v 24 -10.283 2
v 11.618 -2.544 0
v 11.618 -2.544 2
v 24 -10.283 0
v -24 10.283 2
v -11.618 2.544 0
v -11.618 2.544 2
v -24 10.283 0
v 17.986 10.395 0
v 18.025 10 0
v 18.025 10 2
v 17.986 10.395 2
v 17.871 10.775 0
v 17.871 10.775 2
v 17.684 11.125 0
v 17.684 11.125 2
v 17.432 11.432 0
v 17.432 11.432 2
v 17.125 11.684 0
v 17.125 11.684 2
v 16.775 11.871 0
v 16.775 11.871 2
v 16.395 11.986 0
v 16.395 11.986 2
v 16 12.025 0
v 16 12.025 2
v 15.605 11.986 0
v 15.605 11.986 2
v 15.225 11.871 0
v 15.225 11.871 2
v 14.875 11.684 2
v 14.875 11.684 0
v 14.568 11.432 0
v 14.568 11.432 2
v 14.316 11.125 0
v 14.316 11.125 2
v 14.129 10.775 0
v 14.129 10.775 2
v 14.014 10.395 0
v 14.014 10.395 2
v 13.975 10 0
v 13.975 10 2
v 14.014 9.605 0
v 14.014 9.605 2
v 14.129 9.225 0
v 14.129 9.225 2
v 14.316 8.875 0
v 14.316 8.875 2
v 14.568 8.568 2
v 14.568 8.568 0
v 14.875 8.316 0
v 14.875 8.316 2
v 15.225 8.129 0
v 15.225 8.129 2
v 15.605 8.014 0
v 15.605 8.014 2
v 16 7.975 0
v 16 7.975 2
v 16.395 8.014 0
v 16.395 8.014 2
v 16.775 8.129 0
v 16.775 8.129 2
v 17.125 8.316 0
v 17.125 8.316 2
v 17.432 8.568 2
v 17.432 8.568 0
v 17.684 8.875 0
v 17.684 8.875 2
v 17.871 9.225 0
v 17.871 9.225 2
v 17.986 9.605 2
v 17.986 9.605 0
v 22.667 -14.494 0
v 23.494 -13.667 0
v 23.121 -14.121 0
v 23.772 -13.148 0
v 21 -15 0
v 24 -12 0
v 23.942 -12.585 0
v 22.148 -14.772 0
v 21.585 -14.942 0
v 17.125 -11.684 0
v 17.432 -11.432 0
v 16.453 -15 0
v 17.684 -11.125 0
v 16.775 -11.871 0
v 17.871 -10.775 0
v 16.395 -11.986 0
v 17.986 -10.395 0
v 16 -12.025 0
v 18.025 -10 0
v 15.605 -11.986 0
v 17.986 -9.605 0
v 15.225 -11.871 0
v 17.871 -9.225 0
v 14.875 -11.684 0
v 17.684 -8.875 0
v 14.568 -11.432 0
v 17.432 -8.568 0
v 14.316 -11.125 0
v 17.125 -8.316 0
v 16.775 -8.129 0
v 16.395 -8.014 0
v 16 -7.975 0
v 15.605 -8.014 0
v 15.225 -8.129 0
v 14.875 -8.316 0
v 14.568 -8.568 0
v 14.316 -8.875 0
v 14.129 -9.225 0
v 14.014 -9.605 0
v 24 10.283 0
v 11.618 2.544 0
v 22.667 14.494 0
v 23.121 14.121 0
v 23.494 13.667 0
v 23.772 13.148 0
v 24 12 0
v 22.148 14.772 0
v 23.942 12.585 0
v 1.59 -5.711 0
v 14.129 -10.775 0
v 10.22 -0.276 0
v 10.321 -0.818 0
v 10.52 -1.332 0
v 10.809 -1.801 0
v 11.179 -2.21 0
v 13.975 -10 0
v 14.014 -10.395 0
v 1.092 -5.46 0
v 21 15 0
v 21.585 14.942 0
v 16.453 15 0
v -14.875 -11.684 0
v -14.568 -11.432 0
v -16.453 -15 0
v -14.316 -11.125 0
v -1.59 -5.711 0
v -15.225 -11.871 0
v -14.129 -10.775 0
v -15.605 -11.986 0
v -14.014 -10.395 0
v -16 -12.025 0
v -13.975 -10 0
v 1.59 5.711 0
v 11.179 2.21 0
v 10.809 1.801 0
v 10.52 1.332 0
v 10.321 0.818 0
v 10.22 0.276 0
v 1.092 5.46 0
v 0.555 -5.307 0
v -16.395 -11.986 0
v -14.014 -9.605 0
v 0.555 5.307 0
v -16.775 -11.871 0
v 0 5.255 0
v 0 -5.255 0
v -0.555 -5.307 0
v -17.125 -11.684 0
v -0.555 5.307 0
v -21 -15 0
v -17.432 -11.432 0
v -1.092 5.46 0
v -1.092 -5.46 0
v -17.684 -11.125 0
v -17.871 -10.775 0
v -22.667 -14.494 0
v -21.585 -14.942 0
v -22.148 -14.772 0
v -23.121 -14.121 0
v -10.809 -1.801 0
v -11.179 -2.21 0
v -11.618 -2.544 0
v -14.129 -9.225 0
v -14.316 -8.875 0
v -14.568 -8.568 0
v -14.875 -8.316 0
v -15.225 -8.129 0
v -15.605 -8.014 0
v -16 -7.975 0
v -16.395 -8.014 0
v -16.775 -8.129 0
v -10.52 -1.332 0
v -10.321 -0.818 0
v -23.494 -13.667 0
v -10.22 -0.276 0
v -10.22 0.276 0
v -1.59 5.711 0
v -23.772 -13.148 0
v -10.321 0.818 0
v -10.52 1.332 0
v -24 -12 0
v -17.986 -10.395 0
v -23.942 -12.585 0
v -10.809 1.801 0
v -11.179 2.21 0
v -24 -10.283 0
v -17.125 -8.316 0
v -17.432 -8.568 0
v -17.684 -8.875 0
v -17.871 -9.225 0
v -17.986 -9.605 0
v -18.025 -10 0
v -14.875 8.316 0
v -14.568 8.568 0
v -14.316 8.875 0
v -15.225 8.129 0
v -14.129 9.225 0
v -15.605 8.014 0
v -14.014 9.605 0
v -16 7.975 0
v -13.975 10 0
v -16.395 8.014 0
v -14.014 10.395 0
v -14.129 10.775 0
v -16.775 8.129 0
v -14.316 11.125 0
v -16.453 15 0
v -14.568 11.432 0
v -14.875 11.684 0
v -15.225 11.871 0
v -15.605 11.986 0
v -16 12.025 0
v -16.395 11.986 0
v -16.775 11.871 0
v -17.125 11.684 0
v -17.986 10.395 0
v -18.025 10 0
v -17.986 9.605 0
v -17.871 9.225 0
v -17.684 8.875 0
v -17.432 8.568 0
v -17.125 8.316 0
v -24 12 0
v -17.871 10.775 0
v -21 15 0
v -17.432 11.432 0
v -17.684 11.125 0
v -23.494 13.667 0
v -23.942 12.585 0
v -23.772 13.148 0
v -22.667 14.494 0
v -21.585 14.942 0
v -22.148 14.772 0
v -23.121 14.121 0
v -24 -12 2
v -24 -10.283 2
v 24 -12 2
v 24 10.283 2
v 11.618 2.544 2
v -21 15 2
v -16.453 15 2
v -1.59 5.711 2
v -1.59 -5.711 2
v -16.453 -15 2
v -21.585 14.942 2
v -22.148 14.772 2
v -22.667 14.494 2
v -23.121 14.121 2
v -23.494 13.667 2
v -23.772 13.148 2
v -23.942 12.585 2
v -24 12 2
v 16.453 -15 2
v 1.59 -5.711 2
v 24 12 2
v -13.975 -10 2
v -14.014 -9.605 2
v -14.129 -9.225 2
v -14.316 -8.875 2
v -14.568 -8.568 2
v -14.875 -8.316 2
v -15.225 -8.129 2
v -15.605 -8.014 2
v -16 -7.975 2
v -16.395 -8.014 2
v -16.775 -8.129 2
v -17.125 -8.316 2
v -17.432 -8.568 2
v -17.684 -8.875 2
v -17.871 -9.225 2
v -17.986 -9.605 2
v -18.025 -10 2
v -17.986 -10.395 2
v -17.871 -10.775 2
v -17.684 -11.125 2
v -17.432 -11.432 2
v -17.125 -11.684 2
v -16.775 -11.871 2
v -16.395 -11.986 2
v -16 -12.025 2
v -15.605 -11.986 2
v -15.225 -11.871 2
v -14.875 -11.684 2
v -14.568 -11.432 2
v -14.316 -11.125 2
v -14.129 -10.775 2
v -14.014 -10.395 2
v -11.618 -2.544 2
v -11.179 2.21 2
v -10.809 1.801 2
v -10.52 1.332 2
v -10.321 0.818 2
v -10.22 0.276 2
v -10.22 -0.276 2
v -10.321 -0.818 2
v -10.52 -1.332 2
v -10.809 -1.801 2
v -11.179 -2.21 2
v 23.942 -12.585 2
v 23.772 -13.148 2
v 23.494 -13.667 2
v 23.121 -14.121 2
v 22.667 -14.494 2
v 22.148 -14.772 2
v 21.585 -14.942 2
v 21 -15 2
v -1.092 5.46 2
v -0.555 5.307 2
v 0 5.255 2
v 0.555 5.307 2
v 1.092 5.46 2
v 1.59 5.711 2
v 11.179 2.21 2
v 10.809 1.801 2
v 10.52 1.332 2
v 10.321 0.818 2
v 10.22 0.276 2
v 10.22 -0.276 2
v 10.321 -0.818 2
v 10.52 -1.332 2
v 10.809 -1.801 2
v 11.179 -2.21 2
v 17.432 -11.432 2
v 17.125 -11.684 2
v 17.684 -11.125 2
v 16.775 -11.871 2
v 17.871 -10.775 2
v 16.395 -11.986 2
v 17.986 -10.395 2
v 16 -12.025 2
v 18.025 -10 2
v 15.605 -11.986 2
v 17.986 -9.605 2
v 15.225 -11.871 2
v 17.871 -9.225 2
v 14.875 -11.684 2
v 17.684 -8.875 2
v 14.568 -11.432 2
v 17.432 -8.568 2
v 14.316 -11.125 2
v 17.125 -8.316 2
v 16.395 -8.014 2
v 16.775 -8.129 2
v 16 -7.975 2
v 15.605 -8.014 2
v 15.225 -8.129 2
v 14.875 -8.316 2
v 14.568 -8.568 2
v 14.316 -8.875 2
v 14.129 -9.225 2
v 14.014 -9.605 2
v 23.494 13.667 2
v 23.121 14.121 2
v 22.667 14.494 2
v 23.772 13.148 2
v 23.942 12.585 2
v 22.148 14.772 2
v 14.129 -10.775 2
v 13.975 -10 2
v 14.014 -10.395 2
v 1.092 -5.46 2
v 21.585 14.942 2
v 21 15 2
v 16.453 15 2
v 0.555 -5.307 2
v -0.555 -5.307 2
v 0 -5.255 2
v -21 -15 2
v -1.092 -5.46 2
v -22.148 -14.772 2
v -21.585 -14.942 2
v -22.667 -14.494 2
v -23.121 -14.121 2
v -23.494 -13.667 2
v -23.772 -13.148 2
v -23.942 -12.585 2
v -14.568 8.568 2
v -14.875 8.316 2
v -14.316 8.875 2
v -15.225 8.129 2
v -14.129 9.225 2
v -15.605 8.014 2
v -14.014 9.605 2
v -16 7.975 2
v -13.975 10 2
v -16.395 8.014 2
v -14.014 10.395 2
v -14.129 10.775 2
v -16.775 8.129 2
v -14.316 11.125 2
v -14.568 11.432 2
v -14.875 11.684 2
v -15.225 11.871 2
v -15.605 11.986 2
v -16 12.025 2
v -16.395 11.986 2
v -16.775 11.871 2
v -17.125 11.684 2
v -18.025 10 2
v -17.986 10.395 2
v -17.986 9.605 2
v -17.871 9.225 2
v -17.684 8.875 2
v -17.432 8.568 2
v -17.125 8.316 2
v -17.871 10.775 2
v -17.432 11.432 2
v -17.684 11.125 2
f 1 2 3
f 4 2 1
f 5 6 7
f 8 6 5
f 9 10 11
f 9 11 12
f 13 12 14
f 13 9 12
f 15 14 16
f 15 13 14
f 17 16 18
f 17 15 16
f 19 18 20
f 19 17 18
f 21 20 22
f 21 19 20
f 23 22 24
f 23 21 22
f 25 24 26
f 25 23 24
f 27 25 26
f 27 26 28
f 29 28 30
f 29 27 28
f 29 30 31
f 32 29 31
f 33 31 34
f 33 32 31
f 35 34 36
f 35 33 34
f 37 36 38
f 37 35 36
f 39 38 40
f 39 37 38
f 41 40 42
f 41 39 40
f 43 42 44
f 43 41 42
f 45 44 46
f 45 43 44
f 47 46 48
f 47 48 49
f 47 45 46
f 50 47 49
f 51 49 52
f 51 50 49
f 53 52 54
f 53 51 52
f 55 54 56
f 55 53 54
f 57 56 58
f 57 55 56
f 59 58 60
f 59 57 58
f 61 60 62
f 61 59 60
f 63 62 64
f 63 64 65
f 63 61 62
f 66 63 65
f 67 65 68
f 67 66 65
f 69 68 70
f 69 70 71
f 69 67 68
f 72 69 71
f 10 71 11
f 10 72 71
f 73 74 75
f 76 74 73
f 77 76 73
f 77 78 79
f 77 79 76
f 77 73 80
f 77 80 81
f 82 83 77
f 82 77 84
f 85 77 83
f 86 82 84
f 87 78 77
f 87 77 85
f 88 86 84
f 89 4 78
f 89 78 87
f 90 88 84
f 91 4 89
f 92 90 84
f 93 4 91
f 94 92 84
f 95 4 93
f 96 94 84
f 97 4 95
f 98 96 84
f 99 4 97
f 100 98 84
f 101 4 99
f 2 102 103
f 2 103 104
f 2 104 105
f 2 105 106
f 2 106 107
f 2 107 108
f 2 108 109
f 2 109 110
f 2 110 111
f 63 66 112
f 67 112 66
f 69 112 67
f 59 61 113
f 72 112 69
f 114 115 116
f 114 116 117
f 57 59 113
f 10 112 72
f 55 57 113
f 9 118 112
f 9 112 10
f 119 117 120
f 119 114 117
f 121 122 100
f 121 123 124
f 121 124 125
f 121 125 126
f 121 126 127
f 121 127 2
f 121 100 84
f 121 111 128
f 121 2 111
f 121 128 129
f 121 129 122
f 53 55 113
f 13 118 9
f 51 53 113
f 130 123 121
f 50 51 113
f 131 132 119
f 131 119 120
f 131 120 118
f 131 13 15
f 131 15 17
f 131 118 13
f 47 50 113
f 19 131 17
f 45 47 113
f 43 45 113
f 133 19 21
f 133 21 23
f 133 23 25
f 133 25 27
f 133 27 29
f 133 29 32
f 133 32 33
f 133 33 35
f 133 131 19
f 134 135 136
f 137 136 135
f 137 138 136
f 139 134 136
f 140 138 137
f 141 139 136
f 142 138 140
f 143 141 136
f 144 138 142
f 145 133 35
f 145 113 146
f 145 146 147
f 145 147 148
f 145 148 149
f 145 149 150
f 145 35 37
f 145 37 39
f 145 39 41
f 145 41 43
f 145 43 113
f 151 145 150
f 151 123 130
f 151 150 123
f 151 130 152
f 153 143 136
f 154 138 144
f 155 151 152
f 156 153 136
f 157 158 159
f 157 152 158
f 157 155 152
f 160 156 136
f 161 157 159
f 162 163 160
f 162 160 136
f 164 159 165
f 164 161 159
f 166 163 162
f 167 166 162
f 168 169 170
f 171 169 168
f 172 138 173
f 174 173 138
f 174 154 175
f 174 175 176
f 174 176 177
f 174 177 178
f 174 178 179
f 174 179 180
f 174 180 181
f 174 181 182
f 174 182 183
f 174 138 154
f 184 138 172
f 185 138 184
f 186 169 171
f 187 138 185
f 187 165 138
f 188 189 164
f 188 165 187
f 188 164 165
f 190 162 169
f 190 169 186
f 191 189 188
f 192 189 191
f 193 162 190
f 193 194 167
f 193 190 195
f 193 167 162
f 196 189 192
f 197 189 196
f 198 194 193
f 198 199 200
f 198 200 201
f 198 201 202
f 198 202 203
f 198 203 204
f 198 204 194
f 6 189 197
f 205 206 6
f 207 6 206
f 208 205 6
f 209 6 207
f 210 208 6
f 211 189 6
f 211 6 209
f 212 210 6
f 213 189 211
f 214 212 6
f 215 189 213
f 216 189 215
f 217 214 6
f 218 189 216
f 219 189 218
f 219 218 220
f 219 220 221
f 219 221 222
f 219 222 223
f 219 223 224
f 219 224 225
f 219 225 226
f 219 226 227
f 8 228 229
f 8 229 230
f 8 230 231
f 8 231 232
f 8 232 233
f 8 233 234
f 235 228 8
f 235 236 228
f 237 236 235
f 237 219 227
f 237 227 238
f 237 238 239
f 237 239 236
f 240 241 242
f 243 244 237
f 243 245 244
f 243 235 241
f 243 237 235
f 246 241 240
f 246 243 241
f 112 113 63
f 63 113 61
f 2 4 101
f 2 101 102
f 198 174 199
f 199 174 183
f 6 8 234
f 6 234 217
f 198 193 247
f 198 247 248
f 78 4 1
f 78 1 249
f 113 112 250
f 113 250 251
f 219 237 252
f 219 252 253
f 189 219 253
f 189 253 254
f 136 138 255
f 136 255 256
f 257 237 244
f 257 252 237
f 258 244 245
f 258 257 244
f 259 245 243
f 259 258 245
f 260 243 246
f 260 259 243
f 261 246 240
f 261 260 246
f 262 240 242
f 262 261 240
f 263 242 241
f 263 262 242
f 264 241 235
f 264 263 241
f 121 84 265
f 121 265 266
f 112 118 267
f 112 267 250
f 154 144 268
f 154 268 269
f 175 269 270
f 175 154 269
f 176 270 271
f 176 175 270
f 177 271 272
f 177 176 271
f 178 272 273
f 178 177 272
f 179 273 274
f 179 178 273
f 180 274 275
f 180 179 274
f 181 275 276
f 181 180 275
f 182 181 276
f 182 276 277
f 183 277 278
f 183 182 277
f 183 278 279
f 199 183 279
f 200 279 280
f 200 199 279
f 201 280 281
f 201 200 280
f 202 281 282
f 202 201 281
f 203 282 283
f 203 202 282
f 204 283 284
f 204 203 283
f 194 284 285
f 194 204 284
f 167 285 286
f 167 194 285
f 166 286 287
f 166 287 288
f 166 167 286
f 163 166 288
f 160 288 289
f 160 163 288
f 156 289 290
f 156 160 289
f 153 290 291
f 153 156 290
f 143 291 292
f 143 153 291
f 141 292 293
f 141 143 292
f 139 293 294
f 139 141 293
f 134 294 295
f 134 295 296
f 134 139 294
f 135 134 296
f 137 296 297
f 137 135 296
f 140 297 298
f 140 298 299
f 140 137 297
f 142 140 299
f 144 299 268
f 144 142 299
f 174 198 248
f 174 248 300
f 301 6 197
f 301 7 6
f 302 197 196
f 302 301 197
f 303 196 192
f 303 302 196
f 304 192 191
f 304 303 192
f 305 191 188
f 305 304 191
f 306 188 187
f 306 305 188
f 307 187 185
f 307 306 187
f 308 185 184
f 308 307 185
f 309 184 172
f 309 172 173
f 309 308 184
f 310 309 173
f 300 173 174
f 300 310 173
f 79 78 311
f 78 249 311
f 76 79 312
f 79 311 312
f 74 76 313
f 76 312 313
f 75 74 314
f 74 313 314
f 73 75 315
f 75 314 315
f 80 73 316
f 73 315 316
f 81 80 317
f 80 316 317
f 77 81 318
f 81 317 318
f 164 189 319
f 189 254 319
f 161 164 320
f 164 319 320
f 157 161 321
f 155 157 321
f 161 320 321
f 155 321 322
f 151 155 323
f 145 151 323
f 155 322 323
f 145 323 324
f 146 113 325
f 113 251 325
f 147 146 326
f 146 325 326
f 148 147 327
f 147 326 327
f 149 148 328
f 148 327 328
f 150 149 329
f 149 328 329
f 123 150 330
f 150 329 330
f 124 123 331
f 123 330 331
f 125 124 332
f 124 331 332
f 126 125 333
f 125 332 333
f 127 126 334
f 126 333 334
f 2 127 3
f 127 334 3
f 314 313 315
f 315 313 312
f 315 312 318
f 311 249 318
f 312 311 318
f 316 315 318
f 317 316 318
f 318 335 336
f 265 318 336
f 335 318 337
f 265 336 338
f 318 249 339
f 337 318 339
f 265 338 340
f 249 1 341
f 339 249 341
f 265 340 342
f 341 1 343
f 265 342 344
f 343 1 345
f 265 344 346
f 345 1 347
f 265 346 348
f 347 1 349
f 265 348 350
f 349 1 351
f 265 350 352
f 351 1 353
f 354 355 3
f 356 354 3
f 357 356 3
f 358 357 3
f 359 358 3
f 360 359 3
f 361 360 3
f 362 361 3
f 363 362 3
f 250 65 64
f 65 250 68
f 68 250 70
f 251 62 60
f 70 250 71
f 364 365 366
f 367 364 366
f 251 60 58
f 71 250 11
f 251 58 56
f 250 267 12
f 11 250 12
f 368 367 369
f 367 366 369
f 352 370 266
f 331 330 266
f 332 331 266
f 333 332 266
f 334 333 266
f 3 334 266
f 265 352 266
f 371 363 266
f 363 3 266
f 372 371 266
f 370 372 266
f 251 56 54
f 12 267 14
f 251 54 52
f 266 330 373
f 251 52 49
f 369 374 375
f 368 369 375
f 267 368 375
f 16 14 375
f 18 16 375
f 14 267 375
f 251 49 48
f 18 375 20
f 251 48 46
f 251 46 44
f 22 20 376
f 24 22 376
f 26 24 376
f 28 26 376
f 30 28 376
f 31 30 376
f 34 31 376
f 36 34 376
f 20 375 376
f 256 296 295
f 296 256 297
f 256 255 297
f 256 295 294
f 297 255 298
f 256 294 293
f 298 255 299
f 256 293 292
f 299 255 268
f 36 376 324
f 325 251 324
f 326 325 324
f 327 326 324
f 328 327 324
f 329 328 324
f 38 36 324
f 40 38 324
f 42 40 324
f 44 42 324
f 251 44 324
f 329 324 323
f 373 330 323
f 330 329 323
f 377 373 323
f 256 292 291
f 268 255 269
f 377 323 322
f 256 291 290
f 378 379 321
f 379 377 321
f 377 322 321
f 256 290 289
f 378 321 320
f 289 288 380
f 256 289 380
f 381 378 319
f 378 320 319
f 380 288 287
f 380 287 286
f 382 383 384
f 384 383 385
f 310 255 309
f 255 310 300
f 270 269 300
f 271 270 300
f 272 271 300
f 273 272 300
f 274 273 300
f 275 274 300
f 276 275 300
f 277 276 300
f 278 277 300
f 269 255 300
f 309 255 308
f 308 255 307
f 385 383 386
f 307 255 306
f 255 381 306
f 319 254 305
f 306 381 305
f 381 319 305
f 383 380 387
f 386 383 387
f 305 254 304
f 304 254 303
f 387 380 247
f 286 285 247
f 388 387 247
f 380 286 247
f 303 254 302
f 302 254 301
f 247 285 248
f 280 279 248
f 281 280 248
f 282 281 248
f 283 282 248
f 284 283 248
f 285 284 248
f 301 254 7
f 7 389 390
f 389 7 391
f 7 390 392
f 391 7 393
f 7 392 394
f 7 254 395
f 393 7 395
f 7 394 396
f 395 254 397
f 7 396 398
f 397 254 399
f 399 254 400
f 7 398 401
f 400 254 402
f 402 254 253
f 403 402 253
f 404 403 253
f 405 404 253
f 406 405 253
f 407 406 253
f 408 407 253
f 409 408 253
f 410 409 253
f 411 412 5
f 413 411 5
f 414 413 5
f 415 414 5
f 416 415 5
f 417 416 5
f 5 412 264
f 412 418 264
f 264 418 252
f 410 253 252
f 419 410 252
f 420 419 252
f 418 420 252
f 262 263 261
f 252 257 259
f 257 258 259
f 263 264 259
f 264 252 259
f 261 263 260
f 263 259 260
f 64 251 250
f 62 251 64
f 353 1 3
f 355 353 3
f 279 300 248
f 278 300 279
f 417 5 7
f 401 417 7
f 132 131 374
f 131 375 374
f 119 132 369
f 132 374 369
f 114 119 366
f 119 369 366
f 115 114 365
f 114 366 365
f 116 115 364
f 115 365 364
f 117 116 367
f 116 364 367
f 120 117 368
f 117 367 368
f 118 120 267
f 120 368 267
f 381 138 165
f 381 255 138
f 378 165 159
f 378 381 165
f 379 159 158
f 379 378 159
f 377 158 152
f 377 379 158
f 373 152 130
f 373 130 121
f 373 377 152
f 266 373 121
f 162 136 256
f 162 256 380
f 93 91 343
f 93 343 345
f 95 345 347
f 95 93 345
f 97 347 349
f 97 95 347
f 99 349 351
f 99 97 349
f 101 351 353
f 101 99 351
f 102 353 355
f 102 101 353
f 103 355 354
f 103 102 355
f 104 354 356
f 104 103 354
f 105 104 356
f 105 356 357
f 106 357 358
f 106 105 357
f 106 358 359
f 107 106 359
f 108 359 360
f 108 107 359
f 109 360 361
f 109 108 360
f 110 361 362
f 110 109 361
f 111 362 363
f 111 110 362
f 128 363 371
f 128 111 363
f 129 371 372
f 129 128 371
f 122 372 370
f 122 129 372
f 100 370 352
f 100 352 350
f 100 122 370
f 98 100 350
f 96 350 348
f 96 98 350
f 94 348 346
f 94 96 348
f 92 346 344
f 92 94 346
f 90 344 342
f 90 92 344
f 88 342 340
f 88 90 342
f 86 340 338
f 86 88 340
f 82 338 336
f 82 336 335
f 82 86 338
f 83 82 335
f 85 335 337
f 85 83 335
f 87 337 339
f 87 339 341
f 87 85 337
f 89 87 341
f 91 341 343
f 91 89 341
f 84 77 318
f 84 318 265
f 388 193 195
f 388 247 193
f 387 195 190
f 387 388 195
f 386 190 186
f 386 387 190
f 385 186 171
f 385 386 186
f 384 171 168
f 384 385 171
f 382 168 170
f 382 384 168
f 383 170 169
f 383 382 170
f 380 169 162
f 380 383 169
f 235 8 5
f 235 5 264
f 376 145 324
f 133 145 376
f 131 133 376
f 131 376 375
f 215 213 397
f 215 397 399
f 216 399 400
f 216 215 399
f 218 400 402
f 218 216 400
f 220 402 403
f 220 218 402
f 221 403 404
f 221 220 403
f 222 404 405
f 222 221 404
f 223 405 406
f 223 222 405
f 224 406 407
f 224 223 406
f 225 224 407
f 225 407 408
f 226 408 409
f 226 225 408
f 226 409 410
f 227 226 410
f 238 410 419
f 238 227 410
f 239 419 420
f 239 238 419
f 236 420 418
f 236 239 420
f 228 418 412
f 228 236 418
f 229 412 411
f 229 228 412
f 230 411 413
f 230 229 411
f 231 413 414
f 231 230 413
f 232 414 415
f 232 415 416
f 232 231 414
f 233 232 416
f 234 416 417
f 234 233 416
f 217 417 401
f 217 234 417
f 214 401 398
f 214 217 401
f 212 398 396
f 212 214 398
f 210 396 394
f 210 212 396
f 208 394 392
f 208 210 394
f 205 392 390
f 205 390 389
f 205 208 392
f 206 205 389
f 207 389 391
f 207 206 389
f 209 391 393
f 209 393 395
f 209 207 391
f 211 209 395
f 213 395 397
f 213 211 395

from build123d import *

# Parameters (mm, degrees)
SKETCH1_R           = 2.025
BOSS_EXTRUDE1_DEPTH = 2
FILLET1_R           = 3


with BuildPart() as part:
    # Sketch1 → Boss-Extrude1 (new body)
    with BuildSketch(Plane.XY):
        Polygon((-24, 15), (-16.452815094, 15), (0, 4.716990566), (16.452815094, 15), (24, 15), (24, 10.283009434), (7.547184906, 0), (24, -10.283009434), (24, -15), (16.452815094, -15), (0, -4.716990566), (-16.452815094, -15), (-24, -15), (-24, -10.283009434), (-7.547184906, 0), (-24, 10.283009434), align=None)
        with Locations((-16, 10)):
            Circle(SKETCH1_R, mode=Mode.SUBTRACT)
        with Locations((16, 10)):
            Circle(SKETCH1_R, mode=Mode.SUBTRACT)
        with Locations((16, -10)):
            Circle(SKETCH1_R, mode=Mode.SUBTRACT)
        with Locations((-16, -10)):
            Circle(SKETCH1_R, mode=Mode.SUBTRACT)
    extrude(amount=BOSS_EXTRUDE1_DEPTH)

    # Fillet1
    fillet1_edges = [part.edges().sort_by_distance(p)[0] for p in [
        (24, -15, 1),
        (0, -4.716990566, 1),
        (-24, -15, 1),
        (-7.547184906, 0, 1),
        (-24, 15, 1),
        (0, 4.716990566, 1),
        (24, 15, 1),
        (7.547184906, 0, 1),
    ]]
    fillet(fillet1_edges, radius=FILLET1_R)


solid = part.part
